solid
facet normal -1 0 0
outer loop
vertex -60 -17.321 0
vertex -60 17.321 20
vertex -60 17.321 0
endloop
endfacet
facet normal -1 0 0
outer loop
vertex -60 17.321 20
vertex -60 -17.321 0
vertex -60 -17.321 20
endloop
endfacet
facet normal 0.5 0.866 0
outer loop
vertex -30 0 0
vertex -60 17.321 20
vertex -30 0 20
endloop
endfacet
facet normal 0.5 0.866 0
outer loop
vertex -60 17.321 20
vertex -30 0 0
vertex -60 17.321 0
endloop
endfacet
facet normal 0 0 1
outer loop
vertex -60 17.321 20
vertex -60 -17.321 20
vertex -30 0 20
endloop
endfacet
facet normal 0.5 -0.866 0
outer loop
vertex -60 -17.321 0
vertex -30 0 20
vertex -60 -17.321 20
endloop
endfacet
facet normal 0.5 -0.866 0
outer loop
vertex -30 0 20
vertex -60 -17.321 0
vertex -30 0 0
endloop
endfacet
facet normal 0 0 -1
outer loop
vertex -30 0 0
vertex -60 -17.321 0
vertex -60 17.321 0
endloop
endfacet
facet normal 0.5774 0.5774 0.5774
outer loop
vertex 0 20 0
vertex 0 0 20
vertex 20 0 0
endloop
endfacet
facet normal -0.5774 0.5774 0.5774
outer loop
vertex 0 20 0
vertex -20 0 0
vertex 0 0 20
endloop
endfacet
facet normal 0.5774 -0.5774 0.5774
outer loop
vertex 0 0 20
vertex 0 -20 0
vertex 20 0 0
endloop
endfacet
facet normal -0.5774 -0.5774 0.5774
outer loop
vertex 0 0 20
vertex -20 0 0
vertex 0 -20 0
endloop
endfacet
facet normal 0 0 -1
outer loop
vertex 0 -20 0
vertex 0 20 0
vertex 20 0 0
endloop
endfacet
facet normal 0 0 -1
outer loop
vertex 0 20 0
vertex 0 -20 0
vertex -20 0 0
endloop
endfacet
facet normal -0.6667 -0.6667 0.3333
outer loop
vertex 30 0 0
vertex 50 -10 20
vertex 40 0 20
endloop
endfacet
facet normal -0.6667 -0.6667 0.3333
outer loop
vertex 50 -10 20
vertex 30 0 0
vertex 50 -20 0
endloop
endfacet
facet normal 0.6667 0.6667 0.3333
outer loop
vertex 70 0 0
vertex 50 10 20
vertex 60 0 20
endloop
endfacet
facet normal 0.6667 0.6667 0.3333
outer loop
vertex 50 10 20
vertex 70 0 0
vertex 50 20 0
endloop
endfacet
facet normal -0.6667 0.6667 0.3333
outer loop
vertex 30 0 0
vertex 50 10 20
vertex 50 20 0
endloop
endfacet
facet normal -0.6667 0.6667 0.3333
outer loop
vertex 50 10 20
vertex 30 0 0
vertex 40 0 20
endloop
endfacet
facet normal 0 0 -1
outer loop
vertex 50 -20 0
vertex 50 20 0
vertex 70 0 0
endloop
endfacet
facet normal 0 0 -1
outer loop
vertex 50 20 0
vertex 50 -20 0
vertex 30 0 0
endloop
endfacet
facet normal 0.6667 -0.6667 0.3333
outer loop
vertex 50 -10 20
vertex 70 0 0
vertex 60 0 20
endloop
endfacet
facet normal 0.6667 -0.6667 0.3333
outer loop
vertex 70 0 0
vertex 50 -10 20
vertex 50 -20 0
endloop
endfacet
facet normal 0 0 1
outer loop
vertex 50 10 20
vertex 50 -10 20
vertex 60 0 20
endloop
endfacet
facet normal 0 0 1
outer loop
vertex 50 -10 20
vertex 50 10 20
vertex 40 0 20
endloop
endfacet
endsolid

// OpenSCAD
// originally from https://en.wikibooks.org/wiki/OpenSCAD_User_Manual/Primitive_Solids#cylinder

translate([-50, 0, 0])
cylinder(20,20,20, $fn=3);

color("brown")
cylinder(20,20,00, $fn=4);

color("green")
translate([50, 0, 0])
cylinder(20,20,10, $fn=4);
